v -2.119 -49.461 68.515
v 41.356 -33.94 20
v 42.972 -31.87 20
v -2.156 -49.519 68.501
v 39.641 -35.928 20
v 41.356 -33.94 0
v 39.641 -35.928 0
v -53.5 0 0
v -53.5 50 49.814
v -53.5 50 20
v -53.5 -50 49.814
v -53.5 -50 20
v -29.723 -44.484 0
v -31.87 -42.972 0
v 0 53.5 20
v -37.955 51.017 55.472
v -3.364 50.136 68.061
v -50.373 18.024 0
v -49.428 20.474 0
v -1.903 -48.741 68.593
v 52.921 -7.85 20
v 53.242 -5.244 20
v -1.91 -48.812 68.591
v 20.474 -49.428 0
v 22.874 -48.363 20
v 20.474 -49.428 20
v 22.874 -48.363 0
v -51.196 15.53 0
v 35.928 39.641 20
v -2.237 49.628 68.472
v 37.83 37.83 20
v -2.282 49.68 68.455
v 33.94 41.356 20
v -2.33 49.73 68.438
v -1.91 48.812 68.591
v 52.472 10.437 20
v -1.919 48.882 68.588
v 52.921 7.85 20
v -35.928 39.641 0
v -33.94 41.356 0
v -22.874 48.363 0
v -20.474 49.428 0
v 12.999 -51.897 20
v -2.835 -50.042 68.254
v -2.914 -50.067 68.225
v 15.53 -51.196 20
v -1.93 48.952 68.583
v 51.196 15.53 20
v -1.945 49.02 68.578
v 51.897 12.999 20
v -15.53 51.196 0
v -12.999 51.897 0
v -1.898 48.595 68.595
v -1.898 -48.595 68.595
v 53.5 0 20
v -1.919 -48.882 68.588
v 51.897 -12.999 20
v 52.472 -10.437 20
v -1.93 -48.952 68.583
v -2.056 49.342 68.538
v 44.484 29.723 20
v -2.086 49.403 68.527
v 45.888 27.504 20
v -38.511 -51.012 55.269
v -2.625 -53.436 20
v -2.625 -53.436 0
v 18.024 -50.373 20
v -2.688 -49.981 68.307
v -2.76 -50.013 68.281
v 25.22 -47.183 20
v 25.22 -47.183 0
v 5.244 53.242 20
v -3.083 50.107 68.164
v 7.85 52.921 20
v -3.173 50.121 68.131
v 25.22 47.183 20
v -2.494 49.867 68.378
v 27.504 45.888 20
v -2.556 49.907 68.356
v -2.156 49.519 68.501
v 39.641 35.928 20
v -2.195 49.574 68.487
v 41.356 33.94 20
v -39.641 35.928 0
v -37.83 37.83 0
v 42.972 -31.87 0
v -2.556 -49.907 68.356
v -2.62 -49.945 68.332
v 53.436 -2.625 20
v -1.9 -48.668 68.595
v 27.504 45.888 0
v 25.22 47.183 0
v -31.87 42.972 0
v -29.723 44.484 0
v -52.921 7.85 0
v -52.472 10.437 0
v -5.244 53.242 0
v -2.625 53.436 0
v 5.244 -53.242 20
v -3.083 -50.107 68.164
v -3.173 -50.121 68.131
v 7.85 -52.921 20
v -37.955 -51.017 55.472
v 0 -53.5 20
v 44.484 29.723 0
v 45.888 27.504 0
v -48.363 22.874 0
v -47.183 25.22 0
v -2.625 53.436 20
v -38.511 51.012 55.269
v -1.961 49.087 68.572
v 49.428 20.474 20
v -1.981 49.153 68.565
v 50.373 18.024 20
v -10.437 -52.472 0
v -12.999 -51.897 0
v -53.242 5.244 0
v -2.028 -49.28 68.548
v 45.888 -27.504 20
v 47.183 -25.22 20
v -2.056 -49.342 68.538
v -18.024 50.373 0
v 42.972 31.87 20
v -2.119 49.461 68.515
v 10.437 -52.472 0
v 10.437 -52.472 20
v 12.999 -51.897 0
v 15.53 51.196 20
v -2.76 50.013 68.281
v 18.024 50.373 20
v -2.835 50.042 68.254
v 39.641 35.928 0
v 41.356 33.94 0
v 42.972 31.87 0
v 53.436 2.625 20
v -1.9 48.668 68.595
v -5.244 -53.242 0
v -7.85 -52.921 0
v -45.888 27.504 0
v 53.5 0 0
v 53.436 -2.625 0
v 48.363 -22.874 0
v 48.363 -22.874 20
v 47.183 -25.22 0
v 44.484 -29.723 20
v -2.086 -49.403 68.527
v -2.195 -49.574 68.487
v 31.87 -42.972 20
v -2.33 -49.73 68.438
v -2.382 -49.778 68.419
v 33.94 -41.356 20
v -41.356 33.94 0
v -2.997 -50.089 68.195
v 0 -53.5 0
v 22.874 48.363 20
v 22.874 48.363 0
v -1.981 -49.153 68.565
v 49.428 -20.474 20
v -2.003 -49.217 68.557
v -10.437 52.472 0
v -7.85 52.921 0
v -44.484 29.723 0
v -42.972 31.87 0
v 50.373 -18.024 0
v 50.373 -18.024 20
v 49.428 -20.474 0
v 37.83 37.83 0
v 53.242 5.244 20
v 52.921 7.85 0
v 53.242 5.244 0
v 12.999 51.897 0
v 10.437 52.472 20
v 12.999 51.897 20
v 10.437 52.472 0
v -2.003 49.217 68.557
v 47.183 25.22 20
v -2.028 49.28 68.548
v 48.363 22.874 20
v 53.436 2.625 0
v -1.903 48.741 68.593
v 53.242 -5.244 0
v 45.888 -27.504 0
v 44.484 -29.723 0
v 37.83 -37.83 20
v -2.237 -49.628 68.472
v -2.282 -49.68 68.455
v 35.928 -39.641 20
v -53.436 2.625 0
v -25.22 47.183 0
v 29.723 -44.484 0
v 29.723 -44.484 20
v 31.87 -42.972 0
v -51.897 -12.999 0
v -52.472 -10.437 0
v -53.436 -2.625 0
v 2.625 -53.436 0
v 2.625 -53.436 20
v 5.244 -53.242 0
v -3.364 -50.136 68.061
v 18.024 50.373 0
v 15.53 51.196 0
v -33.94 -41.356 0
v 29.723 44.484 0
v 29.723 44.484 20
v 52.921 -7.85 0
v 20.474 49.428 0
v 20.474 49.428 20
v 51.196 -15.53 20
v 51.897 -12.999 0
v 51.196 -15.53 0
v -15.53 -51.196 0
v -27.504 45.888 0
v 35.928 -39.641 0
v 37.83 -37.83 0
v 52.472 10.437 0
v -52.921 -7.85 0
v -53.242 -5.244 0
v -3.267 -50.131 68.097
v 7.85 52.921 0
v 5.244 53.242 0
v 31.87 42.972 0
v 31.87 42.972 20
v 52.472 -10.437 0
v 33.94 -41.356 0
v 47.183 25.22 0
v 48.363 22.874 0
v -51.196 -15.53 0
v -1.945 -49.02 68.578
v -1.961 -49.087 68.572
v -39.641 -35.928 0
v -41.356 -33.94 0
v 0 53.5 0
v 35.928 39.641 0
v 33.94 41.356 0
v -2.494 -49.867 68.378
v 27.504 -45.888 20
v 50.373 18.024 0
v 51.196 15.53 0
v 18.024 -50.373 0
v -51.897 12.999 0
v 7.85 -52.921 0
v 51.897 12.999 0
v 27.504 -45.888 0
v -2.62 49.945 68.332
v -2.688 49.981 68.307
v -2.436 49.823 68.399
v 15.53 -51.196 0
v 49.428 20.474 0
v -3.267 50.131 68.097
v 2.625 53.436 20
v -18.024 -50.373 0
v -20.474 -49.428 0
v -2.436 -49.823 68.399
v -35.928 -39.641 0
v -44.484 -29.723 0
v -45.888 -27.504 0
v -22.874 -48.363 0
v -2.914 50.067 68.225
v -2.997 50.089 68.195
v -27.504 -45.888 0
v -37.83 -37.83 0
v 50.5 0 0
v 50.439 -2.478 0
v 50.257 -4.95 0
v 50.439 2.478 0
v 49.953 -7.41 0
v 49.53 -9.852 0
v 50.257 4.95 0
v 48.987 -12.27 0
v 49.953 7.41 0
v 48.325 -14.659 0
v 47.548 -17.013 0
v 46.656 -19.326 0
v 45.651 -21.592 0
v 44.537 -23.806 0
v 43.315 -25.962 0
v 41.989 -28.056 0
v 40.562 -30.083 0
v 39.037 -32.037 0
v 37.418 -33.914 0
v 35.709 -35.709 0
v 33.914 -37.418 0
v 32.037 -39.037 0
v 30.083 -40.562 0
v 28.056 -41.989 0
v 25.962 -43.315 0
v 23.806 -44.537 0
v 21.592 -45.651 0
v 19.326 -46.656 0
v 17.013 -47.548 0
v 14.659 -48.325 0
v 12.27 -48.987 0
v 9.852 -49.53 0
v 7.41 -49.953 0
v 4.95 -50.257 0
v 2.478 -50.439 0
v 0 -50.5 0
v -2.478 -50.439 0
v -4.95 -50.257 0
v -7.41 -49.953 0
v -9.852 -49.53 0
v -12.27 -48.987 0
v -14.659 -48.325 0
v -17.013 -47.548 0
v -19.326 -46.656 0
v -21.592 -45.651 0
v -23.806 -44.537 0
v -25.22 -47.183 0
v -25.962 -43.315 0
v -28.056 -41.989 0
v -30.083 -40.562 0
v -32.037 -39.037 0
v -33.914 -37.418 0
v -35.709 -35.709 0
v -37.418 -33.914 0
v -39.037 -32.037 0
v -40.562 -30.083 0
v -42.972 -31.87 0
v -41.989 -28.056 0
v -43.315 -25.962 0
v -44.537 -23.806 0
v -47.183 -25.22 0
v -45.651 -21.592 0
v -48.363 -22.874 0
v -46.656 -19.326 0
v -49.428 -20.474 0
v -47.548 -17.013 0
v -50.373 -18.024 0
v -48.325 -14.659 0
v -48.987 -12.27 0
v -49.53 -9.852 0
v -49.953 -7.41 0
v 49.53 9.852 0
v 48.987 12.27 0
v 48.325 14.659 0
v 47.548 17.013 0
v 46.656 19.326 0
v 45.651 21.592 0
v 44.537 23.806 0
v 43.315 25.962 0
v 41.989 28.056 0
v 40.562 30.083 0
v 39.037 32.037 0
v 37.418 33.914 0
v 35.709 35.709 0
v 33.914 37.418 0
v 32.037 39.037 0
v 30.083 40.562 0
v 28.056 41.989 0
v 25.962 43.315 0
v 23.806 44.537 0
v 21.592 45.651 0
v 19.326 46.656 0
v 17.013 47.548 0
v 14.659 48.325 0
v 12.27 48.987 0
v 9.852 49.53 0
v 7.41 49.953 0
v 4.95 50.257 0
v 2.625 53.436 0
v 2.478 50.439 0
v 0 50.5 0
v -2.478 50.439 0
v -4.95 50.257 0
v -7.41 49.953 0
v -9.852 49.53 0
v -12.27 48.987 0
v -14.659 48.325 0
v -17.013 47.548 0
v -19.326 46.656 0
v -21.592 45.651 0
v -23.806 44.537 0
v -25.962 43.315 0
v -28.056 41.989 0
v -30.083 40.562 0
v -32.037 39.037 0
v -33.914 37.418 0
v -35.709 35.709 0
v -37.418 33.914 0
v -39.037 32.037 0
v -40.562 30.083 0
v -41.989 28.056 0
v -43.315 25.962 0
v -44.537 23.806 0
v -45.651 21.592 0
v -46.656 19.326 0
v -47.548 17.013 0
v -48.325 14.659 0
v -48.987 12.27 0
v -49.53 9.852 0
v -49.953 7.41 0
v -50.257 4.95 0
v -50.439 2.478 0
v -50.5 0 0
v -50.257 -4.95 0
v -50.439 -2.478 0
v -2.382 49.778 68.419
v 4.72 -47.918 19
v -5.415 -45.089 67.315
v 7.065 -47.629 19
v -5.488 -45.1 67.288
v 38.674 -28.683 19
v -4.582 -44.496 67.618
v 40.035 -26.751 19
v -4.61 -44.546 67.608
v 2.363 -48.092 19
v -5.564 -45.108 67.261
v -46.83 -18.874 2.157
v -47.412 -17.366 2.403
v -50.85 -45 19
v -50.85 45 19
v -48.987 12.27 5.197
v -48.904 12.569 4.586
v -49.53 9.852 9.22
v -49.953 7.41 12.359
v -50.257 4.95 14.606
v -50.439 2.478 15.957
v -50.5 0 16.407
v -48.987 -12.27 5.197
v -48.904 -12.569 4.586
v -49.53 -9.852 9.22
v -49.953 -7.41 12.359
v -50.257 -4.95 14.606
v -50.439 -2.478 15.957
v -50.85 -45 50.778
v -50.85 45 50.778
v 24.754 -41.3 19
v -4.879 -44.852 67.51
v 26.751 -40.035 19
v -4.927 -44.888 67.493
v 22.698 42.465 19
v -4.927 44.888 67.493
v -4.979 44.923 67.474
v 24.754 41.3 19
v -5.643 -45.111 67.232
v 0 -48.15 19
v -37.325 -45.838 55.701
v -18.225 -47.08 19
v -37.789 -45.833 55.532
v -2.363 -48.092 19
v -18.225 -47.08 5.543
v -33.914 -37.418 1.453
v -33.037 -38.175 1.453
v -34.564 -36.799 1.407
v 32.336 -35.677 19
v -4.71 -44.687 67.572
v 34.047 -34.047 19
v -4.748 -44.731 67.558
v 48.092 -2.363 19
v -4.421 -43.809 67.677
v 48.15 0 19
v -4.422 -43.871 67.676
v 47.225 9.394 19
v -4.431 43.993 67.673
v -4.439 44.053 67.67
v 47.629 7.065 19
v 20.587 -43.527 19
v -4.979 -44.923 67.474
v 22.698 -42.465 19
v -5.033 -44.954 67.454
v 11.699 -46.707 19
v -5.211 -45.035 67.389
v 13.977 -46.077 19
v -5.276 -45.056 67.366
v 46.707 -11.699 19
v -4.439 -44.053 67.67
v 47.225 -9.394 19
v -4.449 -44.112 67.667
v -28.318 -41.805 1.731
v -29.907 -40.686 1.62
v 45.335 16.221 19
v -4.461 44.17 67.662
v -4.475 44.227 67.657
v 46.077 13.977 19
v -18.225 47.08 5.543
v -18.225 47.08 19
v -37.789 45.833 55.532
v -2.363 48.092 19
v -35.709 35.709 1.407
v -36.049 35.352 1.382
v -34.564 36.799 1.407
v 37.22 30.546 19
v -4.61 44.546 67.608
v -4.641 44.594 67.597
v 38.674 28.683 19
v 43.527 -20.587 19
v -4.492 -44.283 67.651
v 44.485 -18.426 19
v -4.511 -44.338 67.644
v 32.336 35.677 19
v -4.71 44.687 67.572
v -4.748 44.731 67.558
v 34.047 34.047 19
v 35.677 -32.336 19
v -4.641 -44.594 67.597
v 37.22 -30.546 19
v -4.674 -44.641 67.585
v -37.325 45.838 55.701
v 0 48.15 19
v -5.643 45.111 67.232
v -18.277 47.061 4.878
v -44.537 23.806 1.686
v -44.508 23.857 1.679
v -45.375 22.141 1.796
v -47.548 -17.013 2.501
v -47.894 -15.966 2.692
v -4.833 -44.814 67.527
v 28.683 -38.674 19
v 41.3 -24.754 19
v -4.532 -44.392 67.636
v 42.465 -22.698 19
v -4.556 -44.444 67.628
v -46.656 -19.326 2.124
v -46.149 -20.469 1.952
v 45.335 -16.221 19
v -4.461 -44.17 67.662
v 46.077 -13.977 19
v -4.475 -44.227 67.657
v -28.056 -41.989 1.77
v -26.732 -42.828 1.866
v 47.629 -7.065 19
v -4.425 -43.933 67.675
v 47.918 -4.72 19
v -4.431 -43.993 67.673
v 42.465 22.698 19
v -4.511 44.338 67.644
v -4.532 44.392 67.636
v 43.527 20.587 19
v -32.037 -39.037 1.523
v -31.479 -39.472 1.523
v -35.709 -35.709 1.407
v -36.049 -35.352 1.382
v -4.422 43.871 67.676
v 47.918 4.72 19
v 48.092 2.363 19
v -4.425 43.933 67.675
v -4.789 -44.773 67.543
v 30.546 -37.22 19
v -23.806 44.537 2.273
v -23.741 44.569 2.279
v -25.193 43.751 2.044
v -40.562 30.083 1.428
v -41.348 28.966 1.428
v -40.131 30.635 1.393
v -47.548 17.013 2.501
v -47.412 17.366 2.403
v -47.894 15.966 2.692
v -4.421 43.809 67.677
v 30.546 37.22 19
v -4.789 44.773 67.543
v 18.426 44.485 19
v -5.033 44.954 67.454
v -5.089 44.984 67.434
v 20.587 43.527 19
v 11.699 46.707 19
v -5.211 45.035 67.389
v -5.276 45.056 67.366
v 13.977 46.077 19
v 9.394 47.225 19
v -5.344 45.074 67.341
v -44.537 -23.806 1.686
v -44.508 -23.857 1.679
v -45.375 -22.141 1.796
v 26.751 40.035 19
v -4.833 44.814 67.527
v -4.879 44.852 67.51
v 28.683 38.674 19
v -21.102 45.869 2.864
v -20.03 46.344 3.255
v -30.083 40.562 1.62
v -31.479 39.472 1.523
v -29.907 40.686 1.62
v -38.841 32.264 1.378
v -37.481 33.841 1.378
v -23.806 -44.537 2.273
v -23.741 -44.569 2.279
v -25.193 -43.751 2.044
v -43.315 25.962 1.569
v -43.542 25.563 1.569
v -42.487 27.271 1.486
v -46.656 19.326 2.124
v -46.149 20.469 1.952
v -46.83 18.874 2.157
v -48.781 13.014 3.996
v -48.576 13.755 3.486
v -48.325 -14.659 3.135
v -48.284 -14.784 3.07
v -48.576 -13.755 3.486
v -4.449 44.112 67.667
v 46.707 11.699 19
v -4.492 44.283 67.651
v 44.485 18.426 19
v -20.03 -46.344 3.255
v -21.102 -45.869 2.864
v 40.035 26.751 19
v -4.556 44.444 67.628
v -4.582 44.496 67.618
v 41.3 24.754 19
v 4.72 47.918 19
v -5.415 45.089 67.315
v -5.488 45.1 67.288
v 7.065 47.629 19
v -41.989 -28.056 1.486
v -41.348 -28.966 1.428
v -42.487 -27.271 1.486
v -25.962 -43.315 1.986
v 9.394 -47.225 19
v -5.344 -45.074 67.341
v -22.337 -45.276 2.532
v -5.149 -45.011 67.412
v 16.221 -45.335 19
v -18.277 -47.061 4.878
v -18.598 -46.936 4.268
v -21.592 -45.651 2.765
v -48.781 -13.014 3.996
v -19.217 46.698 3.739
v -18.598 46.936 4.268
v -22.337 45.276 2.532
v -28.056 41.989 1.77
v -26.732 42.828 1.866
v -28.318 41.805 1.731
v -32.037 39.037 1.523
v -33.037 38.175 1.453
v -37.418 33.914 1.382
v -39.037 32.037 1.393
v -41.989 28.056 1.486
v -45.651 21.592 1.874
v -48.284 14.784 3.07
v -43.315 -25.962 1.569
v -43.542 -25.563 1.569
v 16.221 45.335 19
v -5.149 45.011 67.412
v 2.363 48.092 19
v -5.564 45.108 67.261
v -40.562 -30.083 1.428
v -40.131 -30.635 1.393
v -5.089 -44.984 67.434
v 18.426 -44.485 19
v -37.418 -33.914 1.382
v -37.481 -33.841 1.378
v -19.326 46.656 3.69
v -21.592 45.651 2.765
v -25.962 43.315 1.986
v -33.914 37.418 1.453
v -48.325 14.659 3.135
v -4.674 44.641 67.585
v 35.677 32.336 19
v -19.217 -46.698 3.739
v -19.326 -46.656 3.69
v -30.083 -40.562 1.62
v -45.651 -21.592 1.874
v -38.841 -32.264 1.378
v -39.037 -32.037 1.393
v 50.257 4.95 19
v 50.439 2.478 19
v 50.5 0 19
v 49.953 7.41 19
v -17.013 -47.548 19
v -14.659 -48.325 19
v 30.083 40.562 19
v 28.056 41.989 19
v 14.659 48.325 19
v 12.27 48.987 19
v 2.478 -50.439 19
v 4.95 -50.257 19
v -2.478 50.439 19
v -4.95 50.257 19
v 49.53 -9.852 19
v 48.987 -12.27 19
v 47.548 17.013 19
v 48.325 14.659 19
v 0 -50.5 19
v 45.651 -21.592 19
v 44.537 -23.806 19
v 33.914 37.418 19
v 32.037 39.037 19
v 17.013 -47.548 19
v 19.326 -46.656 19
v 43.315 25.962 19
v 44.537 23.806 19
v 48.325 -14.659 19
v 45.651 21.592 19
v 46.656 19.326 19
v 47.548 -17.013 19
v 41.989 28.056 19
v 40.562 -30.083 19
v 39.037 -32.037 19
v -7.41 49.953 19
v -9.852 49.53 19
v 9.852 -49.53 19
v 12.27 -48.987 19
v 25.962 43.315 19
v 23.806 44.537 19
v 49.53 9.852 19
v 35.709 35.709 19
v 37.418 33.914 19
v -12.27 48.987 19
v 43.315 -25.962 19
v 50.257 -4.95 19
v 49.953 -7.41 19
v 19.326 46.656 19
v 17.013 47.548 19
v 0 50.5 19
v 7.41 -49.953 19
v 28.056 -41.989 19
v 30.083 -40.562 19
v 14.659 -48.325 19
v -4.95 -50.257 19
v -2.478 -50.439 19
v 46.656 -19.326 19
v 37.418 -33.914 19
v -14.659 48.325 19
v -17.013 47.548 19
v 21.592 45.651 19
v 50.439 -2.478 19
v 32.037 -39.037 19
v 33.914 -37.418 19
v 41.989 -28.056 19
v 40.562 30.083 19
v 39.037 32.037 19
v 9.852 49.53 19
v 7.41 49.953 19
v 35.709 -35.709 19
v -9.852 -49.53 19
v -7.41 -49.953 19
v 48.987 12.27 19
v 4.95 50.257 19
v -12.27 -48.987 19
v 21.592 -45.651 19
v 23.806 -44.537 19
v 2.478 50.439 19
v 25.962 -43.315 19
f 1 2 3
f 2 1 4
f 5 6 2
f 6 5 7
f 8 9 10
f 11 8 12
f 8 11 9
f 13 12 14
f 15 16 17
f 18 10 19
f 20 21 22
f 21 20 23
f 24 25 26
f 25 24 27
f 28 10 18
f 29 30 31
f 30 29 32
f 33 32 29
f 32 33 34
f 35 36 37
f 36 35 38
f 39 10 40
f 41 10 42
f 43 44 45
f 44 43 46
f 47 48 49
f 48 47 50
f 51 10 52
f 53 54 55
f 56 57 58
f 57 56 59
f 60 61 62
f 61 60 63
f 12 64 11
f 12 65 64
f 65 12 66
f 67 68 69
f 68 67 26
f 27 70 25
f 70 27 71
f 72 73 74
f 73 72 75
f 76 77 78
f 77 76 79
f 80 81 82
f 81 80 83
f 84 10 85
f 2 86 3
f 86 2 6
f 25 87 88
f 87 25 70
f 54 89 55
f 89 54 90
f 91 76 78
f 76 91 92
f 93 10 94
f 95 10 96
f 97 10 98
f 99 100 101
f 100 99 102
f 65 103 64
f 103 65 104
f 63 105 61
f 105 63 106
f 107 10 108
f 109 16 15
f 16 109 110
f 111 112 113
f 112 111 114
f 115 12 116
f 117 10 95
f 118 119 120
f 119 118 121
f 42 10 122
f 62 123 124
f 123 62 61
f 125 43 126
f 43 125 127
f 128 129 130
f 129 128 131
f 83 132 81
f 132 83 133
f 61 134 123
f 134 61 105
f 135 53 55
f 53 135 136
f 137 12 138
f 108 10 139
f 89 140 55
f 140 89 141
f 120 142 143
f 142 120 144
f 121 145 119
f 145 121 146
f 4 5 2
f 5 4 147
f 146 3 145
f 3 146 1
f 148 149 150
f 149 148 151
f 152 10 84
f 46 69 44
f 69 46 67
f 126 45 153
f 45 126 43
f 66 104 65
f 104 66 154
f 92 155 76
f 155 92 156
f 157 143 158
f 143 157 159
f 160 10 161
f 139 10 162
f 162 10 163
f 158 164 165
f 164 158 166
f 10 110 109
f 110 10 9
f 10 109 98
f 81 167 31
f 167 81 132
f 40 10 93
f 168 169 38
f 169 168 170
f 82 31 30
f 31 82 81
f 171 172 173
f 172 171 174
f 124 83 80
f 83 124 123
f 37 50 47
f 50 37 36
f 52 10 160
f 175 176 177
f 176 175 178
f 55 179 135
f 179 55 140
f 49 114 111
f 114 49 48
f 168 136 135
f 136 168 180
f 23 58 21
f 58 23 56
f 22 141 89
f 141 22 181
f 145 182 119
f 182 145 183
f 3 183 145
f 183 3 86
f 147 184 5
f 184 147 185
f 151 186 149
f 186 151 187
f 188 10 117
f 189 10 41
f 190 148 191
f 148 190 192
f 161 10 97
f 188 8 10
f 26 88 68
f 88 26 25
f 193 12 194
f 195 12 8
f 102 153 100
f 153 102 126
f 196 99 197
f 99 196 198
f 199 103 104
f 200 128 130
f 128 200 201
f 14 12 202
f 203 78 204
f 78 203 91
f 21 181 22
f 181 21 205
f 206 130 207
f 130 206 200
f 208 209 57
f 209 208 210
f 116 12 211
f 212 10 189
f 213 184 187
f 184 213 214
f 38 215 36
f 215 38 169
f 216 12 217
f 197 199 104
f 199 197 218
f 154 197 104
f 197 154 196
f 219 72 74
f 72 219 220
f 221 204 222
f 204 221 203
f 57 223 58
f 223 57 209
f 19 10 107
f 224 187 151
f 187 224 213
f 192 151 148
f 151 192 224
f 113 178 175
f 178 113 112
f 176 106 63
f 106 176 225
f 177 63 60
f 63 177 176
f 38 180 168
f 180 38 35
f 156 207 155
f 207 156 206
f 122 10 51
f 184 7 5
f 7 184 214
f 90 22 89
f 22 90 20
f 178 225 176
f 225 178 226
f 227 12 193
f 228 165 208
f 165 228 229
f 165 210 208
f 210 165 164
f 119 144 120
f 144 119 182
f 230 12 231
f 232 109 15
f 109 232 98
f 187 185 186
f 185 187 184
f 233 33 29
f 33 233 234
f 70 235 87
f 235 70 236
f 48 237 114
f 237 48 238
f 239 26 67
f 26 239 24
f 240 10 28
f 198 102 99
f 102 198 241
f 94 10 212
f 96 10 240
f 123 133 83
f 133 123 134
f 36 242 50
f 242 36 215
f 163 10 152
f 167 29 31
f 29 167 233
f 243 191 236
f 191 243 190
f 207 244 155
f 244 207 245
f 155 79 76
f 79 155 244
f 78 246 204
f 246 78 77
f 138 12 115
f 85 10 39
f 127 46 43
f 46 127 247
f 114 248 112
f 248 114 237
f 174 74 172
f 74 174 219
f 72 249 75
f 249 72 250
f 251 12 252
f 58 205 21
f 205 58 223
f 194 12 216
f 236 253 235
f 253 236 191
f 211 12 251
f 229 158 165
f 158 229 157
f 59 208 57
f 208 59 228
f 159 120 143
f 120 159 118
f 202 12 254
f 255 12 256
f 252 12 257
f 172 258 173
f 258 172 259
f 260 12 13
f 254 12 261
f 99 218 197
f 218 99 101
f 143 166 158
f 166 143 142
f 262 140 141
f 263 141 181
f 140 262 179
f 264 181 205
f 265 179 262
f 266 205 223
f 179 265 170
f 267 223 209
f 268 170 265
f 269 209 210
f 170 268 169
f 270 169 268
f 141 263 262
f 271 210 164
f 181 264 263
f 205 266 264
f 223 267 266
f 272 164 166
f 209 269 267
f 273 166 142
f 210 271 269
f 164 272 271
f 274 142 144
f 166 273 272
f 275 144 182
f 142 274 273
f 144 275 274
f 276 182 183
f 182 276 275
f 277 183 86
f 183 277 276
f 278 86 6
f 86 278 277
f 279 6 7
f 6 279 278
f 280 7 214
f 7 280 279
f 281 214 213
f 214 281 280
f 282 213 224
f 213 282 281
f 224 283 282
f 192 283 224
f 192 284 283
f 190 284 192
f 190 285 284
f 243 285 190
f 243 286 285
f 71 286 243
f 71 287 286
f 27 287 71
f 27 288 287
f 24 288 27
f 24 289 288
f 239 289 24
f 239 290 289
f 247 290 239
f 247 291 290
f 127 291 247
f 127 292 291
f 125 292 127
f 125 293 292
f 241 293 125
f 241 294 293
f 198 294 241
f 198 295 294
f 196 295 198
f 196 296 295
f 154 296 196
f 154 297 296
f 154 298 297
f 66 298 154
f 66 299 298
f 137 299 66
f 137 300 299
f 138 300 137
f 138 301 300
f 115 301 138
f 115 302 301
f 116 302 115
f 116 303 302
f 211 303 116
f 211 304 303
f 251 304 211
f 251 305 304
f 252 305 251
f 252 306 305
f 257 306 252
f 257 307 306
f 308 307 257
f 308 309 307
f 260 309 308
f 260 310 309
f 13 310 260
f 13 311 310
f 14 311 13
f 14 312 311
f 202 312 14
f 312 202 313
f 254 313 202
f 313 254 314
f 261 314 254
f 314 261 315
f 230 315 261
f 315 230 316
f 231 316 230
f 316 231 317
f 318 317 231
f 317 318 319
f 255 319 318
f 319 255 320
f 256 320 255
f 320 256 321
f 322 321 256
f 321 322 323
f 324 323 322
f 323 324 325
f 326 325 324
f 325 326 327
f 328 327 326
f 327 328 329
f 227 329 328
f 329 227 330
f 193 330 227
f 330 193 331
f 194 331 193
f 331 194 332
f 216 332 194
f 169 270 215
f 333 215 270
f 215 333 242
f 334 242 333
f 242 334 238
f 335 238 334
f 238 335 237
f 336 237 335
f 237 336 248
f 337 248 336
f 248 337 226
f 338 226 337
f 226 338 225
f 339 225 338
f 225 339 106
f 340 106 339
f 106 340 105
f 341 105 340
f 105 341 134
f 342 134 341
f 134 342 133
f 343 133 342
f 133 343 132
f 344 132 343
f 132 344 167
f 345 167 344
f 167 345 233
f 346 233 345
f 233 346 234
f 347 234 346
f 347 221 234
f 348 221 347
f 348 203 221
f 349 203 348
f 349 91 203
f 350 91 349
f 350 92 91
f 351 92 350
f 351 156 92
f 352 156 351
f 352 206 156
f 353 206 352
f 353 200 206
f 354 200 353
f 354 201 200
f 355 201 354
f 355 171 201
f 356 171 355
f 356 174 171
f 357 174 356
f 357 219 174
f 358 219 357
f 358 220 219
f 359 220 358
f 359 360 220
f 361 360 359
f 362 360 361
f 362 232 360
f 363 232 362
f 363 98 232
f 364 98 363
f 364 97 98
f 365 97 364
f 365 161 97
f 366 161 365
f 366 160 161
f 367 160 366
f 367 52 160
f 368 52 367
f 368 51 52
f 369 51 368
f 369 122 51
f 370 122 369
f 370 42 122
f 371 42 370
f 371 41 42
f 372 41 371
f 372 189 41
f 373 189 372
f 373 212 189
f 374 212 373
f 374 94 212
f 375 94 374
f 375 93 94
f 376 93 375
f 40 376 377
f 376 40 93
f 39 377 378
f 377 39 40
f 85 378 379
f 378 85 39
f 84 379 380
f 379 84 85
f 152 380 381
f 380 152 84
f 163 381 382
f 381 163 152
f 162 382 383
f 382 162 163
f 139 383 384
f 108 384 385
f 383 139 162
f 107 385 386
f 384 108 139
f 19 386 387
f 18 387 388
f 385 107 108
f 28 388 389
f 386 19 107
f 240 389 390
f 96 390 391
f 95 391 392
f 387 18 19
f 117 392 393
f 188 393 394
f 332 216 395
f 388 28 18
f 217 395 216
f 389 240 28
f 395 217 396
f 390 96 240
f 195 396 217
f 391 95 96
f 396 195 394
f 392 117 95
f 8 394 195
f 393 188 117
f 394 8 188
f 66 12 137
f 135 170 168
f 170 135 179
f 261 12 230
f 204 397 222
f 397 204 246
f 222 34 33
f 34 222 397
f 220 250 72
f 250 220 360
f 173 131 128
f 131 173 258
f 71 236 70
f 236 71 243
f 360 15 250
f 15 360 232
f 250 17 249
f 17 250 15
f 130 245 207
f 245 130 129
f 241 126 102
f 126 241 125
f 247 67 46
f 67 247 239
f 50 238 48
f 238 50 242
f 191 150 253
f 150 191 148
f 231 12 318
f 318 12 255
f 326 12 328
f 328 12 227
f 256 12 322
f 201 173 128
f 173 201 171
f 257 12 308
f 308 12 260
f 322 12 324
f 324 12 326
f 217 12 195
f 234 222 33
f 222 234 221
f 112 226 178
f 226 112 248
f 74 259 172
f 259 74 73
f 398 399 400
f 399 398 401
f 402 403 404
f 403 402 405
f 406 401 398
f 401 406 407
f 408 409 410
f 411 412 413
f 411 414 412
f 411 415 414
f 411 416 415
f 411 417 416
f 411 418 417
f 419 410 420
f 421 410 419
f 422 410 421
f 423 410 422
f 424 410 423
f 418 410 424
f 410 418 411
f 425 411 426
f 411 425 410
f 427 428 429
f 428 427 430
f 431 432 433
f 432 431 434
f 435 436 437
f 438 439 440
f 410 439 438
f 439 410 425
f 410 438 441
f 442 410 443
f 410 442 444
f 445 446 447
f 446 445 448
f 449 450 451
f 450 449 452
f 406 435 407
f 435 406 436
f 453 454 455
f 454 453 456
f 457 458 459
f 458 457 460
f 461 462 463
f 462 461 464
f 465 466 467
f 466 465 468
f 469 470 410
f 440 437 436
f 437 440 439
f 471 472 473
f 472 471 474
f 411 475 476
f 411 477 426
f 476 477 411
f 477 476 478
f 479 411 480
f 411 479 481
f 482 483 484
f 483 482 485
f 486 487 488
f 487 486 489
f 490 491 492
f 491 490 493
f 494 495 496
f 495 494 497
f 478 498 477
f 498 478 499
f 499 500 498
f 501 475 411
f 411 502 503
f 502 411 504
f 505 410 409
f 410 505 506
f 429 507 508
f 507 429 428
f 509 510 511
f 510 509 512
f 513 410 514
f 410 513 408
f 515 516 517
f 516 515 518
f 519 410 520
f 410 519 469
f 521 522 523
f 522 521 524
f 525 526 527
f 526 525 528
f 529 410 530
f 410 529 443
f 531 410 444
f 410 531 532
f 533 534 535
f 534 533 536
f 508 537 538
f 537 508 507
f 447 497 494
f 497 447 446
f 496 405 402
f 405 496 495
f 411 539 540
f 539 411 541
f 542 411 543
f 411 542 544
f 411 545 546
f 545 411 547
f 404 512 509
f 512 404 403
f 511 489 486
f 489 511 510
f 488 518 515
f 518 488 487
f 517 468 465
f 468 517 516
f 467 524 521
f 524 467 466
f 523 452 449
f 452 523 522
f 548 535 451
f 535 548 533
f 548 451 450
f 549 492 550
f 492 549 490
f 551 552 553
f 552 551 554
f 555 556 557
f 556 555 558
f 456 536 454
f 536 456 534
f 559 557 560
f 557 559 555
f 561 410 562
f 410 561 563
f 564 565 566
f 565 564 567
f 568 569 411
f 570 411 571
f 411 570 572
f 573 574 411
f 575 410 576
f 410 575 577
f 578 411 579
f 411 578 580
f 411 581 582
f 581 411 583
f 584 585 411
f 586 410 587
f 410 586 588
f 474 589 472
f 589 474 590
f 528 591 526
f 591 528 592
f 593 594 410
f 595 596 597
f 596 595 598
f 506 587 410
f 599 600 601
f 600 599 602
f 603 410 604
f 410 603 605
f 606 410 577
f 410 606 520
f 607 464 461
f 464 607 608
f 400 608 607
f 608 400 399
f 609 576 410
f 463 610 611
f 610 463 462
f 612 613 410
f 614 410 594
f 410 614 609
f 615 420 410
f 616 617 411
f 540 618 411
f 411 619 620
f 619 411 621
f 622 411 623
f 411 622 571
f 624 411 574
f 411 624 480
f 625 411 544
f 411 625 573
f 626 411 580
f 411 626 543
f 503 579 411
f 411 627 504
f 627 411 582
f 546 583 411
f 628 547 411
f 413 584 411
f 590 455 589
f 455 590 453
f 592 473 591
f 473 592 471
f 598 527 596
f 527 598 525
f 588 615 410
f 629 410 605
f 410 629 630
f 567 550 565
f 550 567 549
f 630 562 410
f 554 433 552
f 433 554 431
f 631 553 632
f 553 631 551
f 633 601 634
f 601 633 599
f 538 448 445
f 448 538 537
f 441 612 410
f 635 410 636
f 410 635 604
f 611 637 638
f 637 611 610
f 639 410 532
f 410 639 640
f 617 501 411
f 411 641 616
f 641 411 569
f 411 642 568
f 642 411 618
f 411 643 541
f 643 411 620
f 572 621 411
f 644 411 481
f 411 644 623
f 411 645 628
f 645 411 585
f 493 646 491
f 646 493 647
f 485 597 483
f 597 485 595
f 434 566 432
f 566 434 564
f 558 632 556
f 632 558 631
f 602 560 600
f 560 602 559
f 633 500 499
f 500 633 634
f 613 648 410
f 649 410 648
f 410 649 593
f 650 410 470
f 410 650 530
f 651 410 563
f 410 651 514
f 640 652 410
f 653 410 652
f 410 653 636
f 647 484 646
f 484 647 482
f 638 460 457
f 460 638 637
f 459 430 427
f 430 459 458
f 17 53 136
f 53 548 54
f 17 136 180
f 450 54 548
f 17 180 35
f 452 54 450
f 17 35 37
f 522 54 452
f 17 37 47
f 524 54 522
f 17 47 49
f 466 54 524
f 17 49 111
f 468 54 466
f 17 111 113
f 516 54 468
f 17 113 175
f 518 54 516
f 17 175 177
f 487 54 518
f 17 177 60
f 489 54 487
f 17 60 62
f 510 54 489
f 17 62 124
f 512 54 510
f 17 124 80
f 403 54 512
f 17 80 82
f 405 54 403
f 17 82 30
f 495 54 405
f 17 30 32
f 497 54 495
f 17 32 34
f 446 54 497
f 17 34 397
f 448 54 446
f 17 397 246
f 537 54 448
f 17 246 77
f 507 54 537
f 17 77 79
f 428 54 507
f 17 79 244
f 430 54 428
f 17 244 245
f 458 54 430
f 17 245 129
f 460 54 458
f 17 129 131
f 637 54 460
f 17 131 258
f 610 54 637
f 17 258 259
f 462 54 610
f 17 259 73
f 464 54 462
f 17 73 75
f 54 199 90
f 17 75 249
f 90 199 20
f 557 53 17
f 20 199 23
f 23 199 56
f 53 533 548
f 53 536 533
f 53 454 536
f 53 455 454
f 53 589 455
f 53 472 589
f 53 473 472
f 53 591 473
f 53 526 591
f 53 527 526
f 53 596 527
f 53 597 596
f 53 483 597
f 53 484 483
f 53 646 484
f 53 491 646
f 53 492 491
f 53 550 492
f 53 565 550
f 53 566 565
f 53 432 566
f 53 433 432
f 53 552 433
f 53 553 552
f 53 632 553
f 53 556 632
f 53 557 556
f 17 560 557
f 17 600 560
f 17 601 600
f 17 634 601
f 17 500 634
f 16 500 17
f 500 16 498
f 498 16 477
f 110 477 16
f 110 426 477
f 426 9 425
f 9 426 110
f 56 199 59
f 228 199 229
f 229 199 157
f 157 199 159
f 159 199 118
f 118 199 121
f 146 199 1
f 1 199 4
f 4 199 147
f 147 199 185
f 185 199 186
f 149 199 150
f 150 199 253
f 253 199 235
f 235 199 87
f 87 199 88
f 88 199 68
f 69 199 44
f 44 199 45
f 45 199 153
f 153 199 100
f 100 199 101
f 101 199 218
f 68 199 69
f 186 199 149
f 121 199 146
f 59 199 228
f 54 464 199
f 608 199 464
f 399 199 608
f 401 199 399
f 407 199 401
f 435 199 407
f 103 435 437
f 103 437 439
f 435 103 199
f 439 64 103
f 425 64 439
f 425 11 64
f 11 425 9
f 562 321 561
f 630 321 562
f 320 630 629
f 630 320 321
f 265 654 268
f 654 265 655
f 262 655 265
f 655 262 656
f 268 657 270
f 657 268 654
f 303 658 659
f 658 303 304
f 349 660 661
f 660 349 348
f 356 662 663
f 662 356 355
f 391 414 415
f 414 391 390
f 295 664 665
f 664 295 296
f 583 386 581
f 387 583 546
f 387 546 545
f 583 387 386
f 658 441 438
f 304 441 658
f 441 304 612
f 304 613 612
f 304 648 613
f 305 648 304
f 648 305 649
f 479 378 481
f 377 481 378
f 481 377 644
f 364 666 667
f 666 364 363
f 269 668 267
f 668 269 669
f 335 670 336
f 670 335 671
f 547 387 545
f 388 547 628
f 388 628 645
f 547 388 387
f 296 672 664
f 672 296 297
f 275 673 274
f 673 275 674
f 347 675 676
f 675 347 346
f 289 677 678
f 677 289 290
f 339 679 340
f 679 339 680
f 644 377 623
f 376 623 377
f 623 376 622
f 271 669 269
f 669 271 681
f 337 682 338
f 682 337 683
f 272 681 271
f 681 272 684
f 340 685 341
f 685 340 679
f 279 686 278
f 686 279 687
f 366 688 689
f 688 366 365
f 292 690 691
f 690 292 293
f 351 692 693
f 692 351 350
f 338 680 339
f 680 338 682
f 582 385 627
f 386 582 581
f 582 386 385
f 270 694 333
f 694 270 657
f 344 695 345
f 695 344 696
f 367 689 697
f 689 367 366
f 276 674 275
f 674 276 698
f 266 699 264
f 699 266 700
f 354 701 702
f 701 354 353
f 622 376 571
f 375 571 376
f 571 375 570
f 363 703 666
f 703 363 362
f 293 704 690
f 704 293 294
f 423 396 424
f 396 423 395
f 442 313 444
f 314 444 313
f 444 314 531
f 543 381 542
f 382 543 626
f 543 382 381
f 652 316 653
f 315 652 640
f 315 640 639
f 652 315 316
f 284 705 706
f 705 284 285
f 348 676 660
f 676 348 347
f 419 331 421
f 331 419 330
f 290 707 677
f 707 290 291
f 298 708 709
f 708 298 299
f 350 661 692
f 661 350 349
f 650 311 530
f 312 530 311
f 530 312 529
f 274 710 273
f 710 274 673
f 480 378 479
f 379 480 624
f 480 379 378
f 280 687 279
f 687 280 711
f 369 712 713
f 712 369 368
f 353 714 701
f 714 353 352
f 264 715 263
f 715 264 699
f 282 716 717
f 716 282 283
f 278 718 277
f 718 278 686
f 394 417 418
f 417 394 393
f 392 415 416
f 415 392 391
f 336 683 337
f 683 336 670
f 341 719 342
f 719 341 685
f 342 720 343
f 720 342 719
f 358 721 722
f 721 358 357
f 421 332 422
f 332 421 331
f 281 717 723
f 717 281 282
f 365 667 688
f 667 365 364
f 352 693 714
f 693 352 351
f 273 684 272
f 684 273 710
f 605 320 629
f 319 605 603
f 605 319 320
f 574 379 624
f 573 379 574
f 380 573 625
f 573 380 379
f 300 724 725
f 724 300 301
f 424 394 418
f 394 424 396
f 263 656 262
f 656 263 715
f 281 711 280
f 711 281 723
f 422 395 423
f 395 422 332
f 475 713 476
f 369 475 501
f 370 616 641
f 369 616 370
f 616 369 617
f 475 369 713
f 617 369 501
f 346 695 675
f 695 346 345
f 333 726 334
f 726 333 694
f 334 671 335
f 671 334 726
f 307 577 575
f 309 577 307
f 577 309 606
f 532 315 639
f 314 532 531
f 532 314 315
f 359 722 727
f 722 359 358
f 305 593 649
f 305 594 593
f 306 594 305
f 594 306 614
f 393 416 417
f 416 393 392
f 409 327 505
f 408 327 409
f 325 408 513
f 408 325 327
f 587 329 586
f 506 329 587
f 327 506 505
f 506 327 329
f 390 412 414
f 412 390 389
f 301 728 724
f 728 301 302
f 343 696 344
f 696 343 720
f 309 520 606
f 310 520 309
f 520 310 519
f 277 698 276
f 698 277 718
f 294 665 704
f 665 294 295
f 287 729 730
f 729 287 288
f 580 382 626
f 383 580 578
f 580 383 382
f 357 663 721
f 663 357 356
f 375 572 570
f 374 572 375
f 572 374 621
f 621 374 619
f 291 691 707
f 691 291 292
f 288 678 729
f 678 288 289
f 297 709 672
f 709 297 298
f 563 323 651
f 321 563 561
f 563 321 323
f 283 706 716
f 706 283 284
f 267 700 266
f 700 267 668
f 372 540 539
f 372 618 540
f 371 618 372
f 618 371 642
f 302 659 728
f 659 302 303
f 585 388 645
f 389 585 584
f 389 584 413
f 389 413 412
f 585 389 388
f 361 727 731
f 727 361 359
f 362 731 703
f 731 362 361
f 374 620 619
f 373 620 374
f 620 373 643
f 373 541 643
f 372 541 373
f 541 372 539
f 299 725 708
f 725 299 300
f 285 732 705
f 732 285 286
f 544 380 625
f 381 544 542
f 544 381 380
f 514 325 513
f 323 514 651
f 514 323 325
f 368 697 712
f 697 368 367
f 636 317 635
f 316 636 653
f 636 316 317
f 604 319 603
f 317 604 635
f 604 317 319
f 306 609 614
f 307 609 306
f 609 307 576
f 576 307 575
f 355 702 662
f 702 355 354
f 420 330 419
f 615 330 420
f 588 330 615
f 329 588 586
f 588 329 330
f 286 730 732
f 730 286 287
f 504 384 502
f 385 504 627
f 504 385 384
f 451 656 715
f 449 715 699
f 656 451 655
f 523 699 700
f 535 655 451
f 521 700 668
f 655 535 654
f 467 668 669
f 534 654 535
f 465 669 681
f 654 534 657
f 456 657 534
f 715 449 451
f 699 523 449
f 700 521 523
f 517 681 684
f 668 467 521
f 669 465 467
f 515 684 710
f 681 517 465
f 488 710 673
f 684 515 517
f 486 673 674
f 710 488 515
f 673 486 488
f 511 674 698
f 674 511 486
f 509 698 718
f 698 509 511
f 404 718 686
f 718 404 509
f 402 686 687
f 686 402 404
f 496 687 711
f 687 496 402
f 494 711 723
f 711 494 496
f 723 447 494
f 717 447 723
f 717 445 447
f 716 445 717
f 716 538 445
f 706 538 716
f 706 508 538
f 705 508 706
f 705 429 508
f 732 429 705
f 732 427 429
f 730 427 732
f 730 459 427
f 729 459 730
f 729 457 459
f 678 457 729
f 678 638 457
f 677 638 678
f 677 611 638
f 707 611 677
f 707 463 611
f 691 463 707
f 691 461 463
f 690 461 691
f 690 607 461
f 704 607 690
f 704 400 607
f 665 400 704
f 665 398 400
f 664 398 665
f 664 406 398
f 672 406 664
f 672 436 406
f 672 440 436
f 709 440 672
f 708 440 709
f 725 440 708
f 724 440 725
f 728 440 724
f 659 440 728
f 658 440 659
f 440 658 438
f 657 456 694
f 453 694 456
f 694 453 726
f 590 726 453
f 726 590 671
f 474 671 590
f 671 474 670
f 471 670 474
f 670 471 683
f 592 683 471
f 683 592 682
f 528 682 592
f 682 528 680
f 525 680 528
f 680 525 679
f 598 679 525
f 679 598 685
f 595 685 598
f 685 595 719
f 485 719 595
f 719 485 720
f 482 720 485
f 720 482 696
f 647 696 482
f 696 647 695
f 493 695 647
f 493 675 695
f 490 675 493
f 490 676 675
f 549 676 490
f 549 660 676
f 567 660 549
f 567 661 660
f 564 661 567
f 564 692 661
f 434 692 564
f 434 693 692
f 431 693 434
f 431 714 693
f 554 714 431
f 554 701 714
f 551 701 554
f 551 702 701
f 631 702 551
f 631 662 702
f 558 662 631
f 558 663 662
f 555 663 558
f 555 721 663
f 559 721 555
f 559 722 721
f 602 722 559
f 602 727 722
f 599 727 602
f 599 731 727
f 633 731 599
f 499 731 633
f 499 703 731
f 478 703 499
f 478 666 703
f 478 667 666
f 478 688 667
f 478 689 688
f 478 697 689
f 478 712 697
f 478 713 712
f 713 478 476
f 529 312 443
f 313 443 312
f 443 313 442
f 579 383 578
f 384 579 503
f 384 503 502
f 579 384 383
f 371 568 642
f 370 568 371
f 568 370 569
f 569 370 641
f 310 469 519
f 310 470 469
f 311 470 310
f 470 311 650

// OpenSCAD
$fn=128;
difference(){
hull(){
cylinder(r=(101+6)/2,h=20);
translate([-25-3.5,0,45])cube([50,100,50],center=true);
}


translate([0,0,-1])
scale([0.9,0.9,1])
hull(){
cylinder(r=(101+6)/2,h=20);
translate([-25-3.5-3,0,45])cube([50,100,50],center=true);
}

#translate([-25,0,140])rotate([0,-20,0])cube(150,center=true);
translate([0,0,-1])cylinder(r=101/2,h=20);

}
